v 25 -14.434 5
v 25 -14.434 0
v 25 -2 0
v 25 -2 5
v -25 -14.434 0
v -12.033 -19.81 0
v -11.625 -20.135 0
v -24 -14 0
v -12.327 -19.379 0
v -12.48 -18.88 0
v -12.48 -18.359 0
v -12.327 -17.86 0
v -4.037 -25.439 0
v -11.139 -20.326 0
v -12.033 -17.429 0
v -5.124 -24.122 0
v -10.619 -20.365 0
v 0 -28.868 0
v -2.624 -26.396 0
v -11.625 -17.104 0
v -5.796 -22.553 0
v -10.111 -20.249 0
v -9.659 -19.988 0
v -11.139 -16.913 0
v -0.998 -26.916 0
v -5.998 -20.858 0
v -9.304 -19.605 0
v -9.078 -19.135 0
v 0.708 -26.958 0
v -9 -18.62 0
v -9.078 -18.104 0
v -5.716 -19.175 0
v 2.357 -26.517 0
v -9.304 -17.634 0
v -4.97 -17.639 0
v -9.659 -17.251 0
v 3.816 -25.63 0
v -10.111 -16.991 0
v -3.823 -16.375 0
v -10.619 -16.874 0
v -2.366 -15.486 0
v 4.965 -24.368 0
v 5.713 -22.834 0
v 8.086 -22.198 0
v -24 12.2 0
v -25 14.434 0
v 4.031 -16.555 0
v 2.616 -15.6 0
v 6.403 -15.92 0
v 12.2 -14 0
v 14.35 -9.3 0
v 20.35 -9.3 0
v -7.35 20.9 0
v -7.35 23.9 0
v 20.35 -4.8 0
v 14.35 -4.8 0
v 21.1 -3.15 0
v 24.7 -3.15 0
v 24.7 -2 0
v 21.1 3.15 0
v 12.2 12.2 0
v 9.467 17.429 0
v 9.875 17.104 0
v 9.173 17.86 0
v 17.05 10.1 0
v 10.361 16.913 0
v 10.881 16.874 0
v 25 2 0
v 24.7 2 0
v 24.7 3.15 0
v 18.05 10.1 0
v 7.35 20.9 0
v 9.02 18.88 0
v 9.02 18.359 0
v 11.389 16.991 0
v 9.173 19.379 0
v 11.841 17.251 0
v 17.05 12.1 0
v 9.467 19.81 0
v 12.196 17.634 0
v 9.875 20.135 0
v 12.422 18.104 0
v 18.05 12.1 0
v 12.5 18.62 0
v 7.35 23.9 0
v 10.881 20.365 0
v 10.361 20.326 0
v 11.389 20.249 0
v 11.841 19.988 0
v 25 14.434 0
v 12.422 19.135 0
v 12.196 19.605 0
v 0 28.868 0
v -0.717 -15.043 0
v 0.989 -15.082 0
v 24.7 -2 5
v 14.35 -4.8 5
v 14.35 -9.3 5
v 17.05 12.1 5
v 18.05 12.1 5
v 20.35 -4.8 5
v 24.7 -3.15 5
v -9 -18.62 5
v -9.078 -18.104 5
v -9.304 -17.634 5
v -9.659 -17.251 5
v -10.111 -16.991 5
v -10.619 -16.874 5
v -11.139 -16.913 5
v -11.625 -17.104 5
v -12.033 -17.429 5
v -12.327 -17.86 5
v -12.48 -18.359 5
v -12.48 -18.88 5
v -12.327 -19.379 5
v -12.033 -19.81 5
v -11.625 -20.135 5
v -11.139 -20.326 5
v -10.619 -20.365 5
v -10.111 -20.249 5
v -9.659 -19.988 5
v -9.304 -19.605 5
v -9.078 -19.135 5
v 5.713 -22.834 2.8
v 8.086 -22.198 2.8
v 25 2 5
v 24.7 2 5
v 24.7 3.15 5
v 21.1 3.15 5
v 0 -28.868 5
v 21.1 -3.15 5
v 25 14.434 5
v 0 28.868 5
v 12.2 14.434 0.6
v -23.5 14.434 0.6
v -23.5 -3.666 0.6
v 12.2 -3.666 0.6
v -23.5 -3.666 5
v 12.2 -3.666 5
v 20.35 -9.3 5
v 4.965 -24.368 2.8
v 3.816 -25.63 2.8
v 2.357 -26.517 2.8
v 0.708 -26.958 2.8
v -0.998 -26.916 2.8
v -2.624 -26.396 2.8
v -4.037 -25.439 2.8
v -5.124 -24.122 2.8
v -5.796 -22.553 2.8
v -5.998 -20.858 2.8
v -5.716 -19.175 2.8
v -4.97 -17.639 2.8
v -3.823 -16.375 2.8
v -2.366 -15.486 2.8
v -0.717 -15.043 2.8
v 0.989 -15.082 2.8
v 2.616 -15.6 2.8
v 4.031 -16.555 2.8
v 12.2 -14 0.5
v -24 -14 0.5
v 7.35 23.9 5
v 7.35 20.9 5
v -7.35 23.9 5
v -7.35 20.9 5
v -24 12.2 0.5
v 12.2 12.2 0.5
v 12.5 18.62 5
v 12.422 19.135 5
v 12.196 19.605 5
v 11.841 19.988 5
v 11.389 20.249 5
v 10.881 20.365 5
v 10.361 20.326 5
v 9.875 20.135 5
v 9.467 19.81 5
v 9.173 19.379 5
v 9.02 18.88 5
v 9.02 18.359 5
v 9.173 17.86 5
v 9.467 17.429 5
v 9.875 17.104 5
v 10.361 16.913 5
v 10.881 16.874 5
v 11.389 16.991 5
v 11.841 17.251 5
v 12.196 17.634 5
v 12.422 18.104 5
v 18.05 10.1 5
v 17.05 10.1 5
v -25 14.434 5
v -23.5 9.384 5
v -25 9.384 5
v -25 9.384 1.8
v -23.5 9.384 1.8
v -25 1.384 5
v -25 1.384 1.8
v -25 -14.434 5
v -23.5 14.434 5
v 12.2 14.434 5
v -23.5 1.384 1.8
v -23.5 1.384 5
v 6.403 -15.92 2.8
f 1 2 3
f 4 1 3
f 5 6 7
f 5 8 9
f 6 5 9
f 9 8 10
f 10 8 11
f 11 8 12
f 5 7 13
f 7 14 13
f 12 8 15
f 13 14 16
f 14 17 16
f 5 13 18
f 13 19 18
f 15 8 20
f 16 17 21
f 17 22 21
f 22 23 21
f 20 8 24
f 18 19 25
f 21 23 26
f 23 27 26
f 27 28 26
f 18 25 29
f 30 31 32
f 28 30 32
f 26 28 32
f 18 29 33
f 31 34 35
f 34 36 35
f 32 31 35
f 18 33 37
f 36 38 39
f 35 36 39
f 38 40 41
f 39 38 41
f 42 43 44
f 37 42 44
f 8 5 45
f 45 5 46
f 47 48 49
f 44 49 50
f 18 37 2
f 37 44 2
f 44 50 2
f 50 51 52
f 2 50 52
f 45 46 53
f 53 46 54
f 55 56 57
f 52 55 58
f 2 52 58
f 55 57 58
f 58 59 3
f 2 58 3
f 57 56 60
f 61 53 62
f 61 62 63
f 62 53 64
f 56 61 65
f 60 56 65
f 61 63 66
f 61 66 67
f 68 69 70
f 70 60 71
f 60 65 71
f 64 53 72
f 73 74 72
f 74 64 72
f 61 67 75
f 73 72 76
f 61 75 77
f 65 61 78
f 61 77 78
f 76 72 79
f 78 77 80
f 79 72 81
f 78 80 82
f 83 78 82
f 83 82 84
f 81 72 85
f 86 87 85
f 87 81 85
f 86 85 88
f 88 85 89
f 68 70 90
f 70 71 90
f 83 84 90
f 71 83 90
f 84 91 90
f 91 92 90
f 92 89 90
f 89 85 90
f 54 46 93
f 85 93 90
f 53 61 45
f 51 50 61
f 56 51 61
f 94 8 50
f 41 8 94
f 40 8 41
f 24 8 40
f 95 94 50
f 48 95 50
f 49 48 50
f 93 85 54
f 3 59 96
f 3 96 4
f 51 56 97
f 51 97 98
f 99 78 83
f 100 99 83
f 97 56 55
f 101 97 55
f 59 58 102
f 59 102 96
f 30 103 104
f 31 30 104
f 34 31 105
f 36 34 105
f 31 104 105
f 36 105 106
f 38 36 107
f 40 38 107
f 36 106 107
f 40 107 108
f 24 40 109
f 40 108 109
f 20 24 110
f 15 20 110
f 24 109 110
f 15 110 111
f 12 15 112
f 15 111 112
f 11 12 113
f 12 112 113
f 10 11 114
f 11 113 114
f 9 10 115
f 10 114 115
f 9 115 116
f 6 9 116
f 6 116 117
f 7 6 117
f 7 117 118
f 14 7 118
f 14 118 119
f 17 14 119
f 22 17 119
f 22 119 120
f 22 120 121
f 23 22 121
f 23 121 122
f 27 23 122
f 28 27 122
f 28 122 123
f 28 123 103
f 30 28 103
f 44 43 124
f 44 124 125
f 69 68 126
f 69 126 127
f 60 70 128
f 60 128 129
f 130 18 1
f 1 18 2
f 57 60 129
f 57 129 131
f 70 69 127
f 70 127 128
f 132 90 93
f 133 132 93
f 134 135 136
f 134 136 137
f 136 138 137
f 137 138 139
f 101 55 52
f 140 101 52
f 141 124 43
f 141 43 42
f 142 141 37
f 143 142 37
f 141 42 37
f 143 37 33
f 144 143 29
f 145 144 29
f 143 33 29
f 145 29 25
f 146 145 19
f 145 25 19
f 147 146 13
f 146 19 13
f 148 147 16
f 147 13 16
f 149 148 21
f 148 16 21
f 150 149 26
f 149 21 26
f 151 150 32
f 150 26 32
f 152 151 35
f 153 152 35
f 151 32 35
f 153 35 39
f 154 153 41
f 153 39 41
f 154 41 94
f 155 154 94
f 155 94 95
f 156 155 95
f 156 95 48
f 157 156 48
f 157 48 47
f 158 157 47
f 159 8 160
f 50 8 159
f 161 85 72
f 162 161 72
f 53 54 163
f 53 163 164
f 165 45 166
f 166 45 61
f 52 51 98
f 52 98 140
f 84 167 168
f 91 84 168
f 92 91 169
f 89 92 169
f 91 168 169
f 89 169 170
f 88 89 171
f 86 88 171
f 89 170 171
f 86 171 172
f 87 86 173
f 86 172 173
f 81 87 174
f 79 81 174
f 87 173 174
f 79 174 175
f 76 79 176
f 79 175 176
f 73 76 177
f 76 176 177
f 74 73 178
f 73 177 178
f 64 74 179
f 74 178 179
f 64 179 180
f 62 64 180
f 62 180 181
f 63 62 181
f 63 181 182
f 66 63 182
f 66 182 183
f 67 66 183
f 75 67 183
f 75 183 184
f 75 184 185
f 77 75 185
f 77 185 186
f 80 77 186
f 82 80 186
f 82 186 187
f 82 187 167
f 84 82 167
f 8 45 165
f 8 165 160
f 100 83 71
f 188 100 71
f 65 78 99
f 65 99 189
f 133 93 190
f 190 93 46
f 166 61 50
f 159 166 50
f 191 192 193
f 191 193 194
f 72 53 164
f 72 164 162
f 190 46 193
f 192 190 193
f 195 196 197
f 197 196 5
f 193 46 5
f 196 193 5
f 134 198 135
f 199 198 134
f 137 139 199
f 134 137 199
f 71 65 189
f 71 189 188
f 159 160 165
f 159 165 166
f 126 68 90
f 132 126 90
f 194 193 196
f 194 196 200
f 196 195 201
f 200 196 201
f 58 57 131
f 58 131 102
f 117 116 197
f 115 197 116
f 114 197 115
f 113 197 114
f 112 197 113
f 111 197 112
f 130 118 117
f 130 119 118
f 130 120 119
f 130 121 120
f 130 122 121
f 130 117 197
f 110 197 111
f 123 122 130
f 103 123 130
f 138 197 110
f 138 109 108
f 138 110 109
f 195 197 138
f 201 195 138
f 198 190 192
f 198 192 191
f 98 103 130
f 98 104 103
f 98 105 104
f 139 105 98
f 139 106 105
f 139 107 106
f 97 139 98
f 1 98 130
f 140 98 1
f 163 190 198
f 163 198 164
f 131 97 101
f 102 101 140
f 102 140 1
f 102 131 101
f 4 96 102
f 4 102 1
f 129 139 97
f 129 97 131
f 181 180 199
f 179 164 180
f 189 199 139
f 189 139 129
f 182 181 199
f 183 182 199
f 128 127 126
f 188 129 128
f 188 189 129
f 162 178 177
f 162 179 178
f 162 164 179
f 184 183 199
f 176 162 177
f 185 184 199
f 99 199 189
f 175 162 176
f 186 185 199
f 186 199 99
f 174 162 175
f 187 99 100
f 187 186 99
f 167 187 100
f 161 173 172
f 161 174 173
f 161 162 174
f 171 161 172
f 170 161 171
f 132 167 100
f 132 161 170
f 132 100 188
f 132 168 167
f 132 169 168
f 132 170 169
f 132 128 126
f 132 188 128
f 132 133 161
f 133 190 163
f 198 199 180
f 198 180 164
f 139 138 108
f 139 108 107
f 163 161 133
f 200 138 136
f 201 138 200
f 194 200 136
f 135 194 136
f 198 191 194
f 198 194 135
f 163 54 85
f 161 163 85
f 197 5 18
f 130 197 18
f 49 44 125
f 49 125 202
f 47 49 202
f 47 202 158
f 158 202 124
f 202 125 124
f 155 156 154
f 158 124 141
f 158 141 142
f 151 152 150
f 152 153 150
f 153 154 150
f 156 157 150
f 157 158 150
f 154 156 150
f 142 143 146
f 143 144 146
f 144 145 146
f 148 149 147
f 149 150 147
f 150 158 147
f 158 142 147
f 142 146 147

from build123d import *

# Parameters (mm, degrees)
PAD_DEPTH       = 5
SKETCH001_R     = 1.75
POCKET_DEPTH    = 5.001
SKETCH002_W     = 36.2
SKETCH002_H     = 26.2
POCKET001_DEPTH = 0.5
SKETCH003_R     = 6
POCKET002_DEPTH = 2.8
POCKET003_DEPTH = 2.8
SKETCH005_W     = 6
SKETCH005_H     = 4.5
POCKET004_DEPTH = 5.001
SKETCH006_W     = 14.7
SKETCH006_H     = 3
POCKET005_DEPTH = 5.001
SKETCH007_W     = 35.7
SKETCH007_H     = 18.1
POCKET006_DEPTH = 4.4
SKETCH008_W     = 1.5
SKETCH008_H     = 8
POCKET007_DEPTH = 3.2
POCKET008_DEPTH = 5.001
SKETCH010_W     = 1
SKETCH010_H     = 2
POCKET009_DEPTH = 5.001


with BuildPart() as part:
    # Sketch → Pad (new body)
    with BuildSketch(Plane.XY):
        Polygon((-25, 14.433757), (-25, -14.433757), (0, -28.867513), (25, -14.433757), (25, 14.433757), (0, 28.867513), align=None)
    extrude(amount=PAD_DEPTH)

    # Sketch001 → Pocket (cut, through all)
    with BuildSketch(Plane.XY.offset(5)):
        with Locations((-10.75, -18.619546)):
            Circle(SKETCH001_R)
        with Locations((10.75, 18.619546)):
            Circle(SKETCH001_R)
    extrude(amount=-POCKET_DEPTH, mode=Mode.SUBTRACT)

    # Sketch002 → Pocket001 (cut)
    with BuildSketch(Plane(origin=(0, 0, 0), x_dir=(1, 0, 0), z_dir=(0, 0, -1))):
        with Locations((-5.9, 0.9)):
            Rectangle(SKETCH002_W, SKETCH002_H)
    extrude(amount=-POCKET001_DEPTH, mode=Mode.SUBTRACT)

    # Sketch003 → Pocket002 (cut)
    with BuildSketch(Plane(origin=(0, 0, 0), x_dir=(1, 0, 0), z_dir=(0, 0, -1))):
        with Locations((0, 21)):
            Circle(SKETCH003_R)
    extrude(amount=-POCKET002_DEPTH, mode=Mode.SUBTRACT)

    # Sketch004 → Pocket003 (cut)
    with BuildSketch(Plane(origin=(0, 0, 0), x_dir=(1, 0, 0), z_dir=(0, 0, -1))):
        Polygon((0.841162, 24.139259), (8.085606, 22.198116), (6.403282, 15.919598), (-0.841162, 17.860741), align=None)
    extrude(amount=-POCKET003_DEPTH, mode=Mode.SUBTRACT)

    # Sketch005 → Pocket004 (cut, through all)
    with BuildSketch(Plane(origin=(0, 0, 0), x_dir=(1, 0, 0), z_dir=(0, 0, -1))):
        with Locations((17.35, 7.05)):
            Rectangle(SKETCH005_W, SKETCH005_H)
    extrude(amount=-POCKET004_DEPTH, mode=Mode.SUBTRACT)

    # Sketch006 → Pocket005 (cut, through all)
    with BuildSketch(Plane(origin=(0, 0, 0), x_dir=(1, 0, 0), z_dir=(0, 0, -1))):
        with Locations((0, -22.4)):
            Rectangle(SKETCH006_W, SKETCH006_H)
    extrude(amount=-POCKET005_DEPTH, mode=Mode.SUBTRACT)

    # Sketch007 → Pocket006 (cut)
    with BuildSketch(Plane.XY.offset(5)):
        with Locations((-5.65, 5.383757)):
            Rectangle(SKETCH007_W, SKETCH007_H)
    extrude(amount=-POCKET006_DEPTH, mode=Mode.SUBTRACT)

    # Sketch008 → Pocket007 (cut)
    with BuildSketch(Plane.XY.offset(5)):
        with Locations((-24.25, 5.383757)):
            Rectangle(SKETCH008_W, SKETCH008_H)
    extrude(amount=-POCKET007_DEPTH, mode=Mode.SUBTRACT)

    # Sketch009 → Pocket008 (cut, through all)
    with BuildSketch(Plane(origin=(0, 0, 0), x_dir=(1, 0, 0), z_dir=(0, 0, -1))):
        Polygon((21.1, 3.15), (24.7, 3.15), (24.7, 2), (25.4, 2), (25.4, -2), (24.7, -2), (24.7, -3.15), (21.1, -3.15), align=None)
    extrude(amount=-POCKET008_DEPTH, mode=Mode.SUBTRACT)

    # Sketch010 → Pocket009 (cut, through all)
    with BuildSketch(Plane(origin=(0, 0, 0), x_dir=(1, 0, 0), z_dir=(0, 0, -1))):
        with Locations((17.55, -11.1)):
            Rectangle(SKETCH010_W, SKETCH010_H)
    extrude(amount=-POCKET009_DEPTH, mode=Mode.SUBTRACT)


solid = part.part
